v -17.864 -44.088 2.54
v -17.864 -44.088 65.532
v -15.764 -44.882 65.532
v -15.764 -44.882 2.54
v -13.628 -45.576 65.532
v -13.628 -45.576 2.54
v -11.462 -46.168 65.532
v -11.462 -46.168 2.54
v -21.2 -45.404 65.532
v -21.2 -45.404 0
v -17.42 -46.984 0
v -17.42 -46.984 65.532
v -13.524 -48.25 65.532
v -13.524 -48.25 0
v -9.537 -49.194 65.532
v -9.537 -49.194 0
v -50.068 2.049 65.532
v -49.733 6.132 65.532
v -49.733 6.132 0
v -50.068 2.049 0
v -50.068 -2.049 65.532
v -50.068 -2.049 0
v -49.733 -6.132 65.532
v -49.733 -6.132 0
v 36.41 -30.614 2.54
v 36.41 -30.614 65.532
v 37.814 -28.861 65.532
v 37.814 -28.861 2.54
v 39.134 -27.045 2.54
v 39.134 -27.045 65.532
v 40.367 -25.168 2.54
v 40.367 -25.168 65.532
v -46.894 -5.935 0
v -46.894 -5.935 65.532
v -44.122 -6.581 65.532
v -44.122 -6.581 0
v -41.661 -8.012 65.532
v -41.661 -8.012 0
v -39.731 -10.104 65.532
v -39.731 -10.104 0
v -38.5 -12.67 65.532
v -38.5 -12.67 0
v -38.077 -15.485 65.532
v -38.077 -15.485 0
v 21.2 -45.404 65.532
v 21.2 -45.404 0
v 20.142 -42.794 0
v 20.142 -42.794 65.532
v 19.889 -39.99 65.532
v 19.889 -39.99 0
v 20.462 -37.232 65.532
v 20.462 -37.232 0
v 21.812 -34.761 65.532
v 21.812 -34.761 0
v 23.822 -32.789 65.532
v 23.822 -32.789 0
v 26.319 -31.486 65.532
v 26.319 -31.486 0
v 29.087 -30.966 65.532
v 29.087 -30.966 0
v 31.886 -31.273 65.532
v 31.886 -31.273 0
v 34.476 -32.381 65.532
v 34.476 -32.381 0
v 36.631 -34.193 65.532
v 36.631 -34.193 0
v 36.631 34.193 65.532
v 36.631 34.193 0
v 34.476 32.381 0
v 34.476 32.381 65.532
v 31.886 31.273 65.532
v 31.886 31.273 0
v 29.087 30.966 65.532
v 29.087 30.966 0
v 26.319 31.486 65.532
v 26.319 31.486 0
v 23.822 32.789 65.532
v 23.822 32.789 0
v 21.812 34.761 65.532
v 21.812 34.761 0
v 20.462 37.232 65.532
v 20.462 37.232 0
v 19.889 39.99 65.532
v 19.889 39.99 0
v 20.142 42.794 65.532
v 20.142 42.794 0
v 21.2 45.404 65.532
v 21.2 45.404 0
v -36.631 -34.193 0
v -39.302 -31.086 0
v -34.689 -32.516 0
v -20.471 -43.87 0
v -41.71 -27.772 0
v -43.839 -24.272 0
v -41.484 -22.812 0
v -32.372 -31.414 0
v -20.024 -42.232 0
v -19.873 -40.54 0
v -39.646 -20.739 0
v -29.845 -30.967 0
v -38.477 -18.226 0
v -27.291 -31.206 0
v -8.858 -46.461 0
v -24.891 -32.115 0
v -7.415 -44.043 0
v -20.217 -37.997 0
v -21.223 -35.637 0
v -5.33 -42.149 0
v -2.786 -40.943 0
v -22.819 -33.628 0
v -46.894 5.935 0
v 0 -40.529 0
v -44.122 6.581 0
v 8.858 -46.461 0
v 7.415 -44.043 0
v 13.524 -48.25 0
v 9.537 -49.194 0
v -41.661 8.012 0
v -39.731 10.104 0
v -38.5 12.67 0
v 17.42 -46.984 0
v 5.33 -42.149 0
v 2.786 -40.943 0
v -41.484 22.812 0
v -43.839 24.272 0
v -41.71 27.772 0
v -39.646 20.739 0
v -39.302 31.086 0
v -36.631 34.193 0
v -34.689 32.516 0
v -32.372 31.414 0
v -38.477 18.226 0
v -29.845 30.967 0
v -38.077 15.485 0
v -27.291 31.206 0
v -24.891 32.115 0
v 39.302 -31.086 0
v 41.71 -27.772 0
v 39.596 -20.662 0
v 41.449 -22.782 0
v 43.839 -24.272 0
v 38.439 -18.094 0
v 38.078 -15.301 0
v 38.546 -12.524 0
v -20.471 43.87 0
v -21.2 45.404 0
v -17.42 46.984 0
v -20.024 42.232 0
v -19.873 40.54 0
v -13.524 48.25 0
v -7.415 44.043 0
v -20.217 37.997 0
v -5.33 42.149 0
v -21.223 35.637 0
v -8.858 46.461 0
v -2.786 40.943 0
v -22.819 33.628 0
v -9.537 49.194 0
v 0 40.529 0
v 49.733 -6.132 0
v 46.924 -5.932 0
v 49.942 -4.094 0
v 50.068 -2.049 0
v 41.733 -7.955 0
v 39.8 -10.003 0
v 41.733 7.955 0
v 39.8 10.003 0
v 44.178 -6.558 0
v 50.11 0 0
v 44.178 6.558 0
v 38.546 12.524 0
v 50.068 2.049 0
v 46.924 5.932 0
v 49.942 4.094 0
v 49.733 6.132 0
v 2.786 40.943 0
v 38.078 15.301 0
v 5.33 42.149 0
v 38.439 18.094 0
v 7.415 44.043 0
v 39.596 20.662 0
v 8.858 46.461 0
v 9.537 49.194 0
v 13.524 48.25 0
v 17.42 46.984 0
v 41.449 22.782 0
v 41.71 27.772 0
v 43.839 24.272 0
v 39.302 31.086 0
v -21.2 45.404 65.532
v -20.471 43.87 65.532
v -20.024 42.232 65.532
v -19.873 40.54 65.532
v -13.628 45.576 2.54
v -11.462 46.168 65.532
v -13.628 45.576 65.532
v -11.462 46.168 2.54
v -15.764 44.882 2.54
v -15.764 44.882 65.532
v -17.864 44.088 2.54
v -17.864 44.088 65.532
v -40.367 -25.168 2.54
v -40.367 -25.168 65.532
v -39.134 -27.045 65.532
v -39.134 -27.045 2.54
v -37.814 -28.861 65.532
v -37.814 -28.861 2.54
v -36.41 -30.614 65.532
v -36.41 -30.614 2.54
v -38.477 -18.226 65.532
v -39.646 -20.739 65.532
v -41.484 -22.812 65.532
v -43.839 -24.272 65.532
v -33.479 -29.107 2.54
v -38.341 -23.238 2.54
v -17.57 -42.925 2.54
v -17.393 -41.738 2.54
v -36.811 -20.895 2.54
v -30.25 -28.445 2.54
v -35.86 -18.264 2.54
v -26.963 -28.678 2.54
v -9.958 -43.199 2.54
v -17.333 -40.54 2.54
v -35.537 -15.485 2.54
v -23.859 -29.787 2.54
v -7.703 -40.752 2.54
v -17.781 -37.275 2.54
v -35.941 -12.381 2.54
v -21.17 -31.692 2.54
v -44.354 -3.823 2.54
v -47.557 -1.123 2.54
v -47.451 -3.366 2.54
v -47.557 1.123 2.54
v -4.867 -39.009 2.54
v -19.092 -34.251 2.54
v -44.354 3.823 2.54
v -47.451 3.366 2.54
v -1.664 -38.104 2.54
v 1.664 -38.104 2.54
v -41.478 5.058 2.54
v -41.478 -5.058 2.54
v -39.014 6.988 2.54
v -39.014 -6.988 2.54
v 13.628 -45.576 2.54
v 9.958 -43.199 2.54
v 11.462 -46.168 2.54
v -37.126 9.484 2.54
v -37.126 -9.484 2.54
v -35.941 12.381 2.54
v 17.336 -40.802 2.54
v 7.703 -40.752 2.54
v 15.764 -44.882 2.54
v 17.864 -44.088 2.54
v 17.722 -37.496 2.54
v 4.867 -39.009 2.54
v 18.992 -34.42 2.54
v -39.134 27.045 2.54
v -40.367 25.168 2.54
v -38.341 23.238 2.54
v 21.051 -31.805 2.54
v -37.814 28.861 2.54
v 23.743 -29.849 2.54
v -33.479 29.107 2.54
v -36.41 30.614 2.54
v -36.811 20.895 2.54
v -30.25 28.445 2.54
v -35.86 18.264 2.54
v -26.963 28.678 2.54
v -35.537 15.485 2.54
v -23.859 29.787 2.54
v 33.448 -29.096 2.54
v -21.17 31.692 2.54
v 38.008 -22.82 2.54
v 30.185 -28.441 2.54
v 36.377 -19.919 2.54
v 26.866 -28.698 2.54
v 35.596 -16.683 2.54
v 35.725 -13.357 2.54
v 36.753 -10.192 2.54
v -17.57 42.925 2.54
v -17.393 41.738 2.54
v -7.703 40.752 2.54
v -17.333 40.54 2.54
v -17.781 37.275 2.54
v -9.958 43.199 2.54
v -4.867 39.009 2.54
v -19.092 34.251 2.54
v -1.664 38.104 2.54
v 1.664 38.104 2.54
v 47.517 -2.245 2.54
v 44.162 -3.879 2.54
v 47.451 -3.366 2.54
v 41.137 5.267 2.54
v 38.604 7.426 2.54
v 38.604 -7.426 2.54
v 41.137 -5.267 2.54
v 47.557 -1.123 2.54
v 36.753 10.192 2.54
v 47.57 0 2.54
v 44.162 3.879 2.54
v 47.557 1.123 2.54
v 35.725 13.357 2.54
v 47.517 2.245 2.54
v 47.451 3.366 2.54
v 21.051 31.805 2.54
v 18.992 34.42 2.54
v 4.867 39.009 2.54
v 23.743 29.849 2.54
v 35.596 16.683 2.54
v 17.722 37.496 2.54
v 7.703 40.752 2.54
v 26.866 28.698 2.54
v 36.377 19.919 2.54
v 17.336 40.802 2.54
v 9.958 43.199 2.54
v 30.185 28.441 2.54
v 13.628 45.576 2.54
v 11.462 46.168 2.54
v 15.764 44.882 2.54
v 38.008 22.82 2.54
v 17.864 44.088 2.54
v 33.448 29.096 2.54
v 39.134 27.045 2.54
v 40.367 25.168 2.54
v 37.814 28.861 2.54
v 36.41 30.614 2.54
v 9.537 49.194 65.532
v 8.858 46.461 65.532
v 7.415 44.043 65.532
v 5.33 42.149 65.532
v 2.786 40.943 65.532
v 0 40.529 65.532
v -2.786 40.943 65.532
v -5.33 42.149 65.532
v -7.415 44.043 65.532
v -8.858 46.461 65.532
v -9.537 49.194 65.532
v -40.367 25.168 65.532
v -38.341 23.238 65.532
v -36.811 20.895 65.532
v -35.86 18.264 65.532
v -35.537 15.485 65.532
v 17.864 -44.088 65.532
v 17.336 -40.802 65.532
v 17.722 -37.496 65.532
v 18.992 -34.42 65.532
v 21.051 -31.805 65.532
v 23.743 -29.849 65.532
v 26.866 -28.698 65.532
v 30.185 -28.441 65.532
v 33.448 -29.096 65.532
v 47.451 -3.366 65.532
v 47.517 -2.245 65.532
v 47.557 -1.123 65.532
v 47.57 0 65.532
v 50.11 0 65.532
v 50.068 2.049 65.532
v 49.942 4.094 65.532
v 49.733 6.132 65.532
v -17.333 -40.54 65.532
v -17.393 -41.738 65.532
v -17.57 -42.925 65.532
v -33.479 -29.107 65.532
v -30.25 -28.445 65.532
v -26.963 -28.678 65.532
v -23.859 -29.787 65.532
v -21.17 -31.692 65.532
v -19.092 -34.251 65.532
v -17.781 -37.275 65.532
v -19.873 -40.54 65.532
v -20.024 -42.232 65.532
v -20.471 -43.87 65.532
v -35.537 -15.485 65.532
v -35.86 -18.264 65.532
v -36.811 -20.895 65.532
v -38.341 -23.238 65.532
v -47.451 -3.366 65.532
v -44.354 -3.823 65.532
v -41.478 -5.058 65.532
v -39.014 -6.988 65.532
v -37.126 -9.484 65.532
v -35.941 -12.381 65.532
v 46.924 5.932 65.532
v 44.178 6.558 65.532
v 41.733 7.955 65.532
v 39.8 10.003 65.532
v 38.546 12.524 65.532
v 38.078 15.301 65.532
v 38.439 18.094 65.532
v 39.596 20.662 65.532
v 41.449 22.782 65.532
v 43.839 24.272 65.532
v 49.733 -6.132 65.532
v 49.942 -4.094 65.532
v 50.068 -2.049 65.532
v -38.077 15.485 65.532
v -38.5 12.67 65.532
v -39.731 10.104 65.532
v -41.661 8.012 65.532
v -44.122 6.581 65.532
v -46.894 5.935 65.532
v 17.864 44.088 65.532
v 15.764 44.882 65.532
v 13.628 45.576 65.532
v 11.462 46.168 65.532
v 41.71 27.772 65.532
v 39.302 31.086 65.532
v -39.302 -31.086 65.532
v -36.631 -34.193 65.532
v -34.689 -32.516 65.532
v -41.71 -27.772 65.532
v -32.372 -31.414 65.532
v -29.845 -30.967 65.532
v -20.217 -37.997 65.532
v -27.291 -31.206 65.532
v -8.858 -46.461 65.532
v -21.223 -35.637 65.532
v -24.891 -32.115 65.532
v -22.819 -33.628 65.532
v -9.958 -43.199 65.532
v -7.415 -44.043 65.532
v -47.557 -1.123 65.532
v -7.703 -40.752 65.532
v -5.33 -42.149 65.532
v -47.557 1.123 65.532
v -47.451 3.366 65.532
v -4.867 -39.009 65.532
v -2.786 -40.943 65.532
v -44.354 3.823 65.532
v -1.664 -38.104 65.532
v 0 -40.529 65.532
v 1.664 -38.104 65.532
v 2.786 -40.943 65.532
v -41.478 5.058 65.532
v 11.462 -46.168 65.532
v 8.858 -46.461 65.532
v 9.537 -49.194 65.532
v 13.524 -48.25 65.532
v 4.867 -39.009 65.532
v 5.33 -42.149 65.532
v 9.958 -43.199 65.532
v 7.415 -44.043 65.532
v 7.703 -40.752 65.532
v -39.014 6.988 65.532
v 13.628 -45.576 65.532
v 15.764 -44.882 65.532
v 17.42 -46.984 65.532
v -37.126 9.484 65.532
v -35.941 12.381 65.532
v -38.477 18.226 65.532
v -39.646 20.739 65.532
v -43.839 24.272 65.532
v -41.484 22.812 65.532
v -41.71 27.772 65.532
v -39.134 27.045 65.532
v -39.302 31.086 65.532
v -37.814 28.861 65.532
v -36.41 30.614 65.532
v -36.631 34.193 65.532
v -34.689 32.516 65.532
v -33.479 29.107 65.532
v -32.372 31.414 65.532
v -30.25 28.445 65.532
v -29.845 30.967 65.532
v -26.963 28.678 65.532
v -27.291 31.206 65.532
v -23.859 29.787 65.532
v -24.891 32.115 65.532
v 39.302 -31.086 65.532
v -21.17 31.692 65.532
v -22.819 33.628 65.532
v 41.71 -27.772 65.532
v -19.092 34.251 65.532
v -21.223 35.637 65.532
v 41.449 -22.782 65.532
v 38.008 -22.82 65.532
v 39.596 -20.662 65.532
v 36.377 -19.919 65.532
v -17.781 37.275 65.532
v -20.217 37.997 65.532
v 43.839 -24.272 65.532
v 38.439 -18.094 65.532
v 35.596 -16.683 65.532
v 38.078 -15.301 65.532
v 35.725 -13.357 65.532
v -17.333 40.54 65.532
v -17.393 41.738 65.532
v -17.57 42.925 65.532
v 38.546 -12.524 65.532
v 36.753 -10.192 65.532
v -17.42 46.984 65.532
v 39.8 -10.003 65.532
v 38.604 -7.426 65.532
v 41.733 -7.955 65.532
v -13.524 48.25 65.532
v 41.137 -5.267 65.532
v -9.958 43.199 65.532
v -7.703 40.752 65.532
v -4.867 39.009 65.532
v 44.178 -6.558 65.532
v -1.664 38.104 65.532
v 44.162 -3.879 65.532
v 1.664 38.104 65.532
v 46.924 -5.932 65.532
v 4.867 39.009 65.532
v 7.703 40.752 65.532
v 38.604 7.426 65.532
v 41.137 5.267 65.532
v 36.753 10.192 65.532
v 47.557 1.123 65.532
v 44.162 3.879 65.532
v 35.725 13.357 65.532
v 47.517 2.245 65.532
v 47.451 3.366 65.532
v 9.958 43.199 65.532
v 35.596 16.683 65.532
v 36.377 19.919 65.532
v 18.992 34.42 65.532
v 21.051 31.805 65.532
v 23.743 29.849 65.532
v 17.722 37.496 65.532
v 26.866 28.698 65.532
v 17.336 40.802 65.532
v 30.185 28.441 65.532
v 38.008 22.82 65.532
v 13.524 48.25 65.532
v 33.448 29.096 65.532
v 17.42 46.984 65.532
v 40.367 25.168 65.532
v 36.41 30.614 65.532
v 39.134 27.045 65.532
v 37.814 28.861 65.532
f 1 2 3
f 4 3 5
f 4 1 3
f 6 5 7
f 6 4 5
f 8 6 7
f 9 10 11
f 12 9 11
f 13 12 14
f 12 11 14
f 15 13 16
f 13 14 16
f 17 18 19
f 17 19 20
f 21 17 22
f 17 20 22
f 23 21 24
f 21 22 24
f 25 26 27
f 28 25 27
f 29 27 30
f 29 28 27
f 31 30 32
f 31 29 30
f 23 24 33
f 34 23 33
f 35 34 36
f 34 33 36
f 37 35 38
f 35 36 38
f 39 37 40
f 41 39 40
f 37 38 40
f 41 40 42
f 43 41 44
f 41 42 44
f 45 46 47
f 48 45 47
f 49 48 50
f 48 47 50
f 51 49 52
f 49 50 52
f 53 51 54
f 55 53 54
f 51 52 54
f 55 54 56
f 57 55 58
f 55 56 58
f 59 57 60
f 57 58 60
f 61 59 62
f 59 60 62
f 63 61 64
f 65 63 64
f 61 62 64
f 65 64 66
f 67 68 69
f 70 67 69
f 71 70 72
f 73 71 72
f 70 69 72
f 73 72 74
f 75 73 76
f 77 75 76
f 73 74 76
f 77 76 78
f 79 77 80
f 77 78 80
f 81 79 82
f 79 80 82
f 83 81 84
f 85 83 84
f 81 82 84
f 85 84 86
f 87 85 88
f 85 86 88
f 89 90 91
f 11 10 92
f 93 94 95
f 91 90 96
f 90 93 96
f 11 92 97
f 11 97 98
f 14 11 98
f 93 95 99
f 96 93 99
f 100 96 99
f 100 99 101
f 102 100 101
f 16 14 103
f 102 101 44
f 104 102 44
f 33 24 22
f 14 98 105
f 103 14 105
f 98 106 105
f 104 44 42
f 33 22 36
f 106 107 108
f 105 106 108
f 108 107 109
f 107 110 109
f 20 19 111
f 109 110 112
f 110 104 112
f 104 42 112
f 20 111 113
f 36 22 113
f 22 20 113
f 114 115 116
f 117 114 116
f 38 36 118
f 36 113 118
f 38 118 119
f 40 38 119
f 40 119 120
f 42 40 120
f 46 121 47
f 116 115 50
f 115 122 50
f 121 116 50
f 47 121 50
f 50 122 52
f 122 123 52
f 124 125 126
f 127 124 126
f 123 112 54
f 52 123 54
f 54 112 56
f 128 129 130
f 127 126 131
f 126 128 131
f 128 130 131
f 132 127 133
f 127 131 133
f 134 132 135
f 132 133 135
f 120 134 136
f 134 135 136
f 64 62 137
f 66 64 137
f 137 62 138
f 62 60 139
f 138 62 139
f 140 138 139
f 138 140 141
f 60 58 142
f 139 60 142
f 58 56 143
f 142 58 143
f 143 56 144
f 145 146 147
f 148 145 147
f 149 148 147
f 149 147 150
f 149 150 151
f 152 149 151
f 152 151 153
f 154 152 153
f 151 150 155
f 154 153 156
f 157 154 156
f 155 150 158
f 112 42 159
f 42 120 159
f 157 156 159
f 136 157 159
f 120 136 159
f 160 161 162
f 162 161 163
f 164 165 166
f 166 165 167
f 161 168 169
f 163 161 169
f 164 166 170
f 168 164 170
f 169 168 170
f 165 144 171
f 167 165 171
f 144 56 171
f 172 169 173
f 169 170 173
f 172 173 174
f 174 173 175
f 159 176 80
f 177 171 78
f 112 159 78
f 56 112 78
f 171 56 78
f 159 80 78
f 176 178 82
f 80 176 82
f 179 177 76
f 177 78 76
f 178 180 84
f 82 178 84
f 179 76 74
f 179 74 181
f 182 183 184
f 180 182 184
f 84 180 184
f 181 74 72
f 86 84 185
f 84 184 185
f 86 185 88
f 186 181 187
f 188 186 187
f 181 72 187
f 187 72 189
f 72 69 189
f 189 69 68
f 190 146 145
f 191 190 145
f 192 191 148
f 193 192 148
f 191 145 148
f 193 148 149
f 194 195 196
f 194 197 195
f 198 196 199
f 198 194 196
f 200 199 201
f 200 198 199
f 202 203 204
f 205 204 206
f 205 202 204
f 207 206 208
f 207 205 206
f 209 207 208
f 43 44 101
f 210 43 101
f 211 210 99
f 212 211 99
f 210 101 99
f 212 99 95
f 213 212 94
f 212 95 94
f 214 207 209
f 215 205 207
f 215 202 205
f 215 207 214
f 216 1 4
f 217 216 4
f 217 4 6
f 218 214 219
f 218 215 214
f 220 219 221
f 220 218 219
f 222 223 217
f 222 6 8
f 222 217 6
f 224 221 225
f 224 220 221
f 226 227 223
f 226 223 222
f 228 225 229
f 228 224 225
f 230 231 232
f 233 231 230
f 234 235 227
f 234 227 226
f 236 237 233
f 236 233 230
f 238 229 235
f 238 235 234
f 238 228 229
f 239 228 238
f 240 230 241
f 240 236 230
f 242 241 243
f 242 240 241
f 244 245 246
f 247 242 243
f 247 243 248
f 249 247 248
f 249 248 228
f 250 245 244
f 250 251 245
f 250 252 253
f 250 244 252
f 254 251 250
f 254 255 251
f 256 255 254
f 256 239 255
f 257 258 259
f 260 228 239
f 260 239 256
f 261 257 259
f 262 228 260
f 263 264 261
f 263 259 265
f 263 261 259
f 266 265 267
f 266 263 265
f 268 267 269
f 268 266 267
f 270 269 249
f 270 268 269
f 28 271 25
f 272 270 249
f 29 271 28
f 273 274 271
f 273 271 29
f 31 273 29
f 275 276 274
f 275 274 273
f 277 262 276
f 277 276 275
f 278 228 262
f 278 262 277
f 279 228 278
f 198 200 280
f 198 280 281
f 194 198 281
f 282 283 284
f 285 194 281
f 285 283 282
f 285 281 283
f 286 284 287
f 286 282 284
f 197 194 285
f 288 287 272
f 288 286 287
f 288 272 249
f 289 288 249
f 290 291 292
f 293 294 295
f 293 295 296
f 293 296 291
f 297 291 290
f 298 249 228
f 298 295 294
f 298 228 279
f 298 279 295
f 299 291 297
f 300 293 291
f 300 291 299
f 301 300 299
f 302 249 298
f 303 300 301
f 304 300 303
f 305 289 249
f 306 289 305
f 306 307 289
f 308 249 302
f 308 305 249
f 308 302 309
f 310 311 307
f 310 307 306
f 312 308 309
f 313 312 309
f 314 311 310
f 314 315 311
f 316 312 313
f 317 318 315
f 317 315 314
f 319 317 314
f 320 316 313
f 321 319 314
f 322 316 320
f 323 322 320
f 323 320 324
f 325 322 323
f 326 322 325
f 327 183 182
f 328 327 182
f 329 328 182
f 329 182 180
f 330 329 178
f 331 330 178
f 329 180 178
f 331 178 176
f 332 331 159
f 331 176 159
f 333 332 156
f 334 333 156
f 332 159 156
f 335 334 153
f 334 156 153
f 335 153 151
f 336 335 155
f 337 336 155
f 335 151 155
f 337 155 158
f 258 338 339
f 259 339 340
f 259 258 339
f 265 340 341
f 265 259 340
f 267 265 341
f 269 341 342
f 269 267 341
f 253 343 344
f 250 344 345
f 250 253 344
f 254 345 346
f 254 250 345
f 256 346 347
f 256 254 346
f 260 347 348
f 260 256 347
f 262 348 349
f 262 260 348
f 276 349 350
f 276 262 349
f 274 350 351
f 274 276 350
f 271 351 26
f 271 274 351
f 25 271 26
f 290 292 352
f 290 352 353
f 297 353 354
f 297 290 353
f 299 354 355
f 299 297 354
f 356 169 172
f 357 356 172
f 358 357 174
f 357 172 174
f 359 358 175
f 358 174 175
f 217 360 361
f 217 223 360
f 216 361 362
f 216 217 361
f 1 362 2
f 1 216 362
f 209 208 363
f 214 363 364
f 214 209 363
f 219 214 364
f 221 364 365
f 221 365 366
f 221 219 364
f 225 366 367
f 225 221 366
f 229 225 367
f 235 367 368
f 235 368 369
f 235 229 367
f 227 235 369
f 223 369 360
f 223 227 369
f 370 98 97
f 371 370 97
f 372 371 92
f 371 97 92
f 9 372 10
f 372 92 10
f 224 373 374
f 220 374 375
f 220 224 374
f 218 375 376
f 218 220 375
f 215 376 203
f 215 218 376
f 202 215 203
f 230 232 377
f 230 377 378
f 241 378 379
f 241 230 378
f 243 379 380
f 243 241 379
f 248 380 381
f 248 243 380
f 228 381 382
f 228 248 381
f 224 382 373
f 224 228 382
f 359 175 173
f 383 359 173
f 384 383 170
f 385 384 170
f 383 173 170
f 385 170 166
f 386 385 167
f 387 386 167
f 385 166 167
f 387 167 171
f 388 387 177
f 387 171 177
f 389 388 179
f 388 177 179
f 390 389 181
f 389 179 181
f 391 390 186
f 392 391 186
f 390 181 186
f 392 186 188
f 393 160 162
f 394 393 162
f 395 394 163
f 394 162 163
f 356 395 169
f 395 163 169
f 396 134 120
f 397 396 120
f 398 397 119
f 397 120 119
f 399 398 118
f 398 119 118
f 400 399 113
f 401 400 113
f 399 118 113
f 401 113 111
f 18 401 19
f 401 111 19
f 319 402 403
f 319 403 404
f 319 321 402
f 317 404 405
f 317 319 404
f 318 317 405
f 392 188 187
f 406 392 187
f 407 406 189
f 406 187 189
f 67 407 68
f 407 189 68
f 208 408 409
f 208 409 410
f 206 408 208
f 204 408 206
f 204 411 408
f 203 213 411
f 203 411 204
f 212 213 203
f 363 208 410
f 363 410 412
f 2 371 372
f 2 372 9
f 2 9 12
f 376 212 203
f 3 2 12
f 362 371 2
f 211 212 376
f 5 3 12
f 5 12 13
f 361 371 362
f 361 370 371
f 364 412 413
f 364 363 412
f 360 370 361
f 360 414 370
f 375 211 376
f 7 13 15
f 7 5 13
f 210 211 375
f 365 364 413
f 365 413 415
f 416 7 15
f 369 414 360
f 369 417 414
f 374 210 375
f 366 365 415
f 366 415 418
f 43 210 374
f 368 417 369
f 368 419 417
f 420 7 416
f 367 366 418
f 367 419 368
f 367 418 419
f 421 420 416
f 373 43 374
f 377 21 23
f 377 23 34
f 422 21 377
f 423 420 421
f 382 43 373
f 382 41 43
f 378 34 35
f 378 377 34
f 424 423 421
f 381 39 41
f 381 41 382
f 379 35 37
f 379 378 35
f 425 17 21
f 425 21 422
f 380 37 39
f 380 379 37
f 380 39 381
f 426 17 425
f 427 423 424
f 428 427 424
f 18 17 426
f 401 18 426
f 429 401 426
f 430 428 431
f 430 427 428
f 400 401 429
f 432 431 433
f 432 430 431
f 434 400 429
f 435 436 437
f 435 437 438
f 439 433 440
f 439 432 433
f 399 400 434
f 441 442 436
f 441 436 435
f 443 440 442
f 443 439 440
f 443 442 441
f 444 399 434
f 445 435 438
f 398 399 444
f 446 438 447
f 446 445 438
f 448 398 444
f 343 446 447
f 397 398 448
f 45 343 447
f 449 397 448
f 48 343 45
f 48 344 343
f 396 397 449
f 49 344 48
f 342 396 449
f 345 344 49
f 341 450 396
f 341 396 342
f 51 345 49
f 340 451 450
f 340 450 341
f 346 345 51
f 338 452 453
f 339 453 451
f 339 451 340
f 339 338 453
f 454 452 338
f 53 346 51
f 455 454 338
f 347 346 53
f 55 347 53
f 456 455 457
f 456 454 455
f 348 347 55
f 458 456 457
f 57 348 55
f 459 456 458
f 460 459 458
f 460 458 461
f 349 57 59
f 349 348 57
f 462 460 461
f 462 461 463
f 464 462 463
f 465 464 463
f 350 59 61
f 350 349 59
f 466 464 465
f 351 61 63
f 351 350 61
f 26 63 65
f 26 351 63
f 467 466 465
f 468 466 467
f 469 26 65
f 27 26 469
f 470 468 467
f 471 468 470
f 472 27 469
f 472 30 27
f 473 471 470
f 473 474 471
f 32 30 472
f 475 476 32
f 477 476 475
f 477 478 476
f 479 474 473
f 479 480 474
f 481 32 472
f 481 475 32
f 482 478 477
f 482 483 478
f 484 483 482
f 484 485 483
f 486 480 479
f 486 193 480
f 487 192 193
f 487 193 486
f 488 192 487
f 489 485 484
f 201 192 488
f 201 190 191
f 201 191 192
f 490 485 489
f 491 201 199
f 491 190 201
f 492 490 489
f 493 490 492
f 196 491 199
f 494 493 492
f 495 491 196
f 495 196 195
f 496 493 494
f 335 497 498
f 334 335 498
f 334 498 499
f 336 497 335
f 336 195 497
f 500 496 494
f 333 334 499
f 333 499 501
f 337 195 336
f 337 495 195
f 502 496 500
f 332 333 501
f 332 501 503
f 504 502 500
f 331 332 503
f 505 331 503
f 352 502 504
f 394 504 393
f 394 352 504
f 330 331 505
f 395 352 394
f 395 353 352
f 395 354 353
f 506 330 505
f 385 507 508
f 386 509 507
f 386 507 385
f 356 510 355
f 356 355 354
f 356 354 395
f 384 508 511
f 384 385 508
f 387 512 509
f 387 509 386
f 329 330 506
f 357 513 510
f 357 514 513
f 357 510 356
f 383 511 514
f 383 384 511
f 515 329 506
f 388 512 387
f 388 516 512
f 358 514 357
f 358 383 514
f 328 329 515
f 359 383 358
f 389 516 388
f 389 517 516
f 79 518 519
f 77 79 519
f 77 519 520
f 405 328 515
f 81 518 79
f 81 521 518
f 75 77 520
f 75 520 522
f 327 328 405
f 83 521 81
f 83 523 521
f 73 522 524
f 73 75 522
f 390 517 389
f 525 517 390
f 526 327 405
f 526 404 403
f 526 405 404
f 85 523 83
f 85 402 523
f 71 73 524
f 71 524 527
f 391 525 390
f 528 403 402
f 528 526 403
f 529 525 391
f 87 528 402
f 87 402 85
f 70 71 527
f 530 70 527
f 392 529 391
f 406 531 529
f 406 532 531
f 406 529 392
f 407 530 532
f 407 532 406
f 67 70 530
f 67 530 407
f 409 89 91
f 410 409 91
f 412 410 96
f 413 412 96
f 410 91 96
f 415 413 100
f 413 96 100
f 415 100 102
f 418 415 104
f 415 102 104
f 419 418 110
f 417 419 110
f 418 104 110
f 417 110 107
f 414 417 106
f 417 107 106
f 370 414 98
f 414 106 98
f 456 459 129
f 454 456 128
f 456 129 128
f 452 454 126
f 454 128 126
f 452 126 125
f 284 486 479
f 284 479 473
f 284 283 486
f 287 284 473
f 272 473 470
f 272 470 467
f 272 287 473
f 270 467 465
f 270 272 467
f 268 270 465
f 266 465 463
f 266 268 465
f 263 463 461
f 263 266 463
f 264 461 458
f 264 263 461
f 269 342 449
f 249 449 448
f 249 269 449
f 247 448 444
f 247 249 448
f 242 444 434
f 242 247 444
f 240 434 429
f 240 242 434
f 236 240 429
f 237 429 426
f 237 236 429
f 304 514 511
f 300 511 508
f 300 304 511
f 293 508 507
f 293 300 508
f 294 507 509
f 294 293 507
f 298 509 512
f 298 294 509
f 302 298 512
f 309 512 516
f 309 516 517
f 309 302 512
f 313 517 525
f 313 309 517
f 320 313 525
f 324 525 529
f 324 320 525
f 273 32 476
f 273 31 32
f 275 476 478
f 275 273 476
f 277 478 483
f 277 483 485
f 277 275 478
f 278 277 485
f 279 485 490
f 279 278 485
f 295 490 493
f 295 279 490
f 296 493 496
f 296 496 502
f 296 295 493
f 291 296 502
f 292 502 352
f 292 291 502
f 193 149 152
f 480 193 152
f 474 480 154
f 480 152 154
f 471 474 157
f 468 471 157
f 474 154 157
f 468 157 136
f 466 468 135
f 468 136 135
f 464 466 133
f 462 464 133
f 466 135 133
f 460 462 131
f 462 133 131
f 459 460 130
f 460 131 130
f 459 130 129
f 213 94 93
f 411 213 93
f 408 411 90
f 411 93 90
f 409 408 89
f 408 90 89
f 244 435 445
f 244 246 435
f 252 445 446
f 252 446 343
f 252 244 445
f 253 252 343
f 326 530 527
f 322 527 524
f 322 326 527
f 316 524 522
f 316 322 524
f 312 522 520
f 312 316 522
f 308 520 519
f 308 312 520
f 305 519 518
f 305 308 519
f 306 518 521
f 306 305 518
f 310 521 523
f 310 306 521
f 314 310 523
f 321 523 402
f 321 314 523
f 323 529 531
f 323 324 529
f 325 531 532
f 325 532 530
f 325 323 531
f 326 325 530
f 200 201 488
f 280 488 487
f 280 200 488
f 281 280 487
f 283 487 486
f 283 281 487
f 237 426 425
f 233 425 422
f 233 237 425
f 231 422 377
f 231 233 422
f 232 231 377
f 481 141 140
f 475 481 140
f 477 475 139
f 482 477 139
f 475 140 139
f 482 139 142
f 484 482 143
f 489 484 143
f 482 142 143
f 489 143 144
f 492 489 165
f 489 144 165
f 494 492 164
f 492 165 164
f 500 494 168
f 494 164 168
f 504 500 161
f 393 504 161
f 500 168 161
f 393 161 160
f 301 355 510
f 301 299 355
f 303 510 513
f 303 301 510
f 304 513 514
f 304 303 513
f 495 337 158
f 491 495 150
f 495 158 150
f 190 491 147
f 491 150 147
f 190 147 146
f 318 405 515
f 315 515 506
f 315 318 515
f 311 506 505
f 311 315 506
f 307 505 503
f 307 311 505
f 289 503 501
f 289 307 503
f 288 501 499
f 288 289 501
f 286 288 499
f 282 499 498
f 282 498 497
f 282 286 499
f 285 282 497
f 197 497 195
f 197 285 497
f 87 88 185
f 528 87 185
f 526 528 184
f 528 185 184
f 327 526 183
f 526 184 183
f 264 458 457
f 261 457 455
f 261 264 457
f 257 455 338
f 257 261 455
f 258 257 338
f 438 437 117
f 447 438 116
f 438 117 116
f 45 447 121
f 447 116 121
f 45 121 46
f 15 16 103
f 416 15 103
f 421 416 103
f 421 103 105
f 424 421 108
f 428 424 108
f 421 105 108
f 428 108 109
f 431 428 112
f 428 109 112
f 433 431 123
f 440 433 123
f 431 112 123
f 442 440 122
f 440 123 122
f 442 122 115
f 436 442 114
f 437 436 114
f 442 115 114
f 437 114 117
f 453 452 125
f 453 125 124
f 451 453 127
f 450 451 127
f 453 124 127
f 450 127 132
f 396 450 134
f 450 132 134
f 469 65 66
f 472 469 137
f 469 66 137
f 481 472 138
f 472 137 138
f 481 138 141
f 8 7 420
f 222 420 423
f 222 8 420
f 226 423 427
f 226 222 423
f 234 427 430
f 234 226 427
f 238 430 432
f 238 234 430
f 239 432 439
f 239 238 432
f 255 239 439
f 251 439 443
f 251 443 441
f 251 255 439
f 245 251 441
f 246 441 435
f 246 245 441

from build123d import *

# Parameters (mm, degrees)
F1_DEPTH = 65.532
F2_T     = -2.54


with BuildPart() as f1:
    # F0 (on Top) → F1 (new body)
    with BuildSketch(Plane.XY):
        with BuildLine():
            ThreePointArc((49.733212, -6.131827), (50.015562, -3.07169), (50.109797, 0))
            ThreePointArc((50.109797, 0), (50.015562, 3.07169), (49.733212, 6.131827))
            ThreePointArc((49.733212, 6.131827), (38.545584, 12.524219), (43.839211, 24.271697))
            ThreePointArc((43.839211, 24.271697), (40.539677, 29.453799), (36.630817, 34.193201))
            ThreePointArc((36.630817, 34.193201), (23.822481, 32.788832), (21.200121, 45.404257))
            ThreePointArc((21.200121, 45.404257), (15.484779, 47.657249), (9.536694, 49.193934))
            ThreePointArc((9.536694, 49.193934), (0, 40.529226), (-9.536694, 49.193934))
            ThreePointArc((-9.536694, 49.193934), (-15.484779, 47.657249), (-21.200121, 45.404257))
            ThreePointArc((-21.200121, 45.404257), (-20.210903, 43.060827), (-19.873228, 40.539677))
            ThreePointArc((-19.873228, 40.539677), (-26.060614, 31.580122), (-36.630817, 34.193201))
            ThreePointArc((-36.630817, 34.193201), (-40.539677, 29.453799), (-43.839211, 24.271697))
            ThreePointArc((-43.839211, 24.271697), (-39.645809, 20.738747), (-38.076678, 15.484779))
            ThreePointArc((-38.076678, 15.484779), (-41.661483, 8.012287), (-49.733212, 6.131827))
            ThreePointArc((-49.733212, 6.131827), (-50.109797, 0), (-49.733212, -6.131827))
            ThreePointArc((-49.733212, -6.131827), (-41.661483, -8.012287), (-38.076678, -15.484779))
            ThreePointArc((-38.076678, -15.484779), (-39.645809, -20.738747), (-43.839211, -24.271697))
            ThreePointArc((-43.839211, -24.271697), (-40.539677, -29.453799), (-36.630817, -34.193201))
            ThreePointArc((-36.630817, -34.193201), (-26.060614, -31.580122), (-19.873228, -40.539677))
            ThreePointArc((-19.873228, -40.539677), (-20.210903, -43.060827), (-21.200121, -45.404257))
            ThreePointArc((-21.200121, -45.404257), (-15.484779, -47.657249), (-9.536694, -49.193934))
            ThreePointArc((-9.536694, -49.193934), (0, -40.529226), (9.536694, -49.193934))
            ThreePointArc((9.536694, -49.193934), (15.484779, -47.657249), (21.200121, -45.404257))
            ThreePointArc((21.200121, -45.404257), (23.822481, -32.788832), (36.630817, -34.193201))
            ThreePointArc((36.630817, -34.193201), (40.539677, -29.453799), (43.839211, -24.271697))
            ThreePointArc((43.839211, -24.271697), (38.545584, -12.524219), (49.733212, -6.131827))
        make_face()
    extrude(amount=F1_DEPTH)

    # F2
    f2_openings = [f1.faces().sort_by_distance(p)[0] for p in [
        (0, 0, 65.532),
    ]]
    offset(amount=F2_T, openings=f2_openings)


solid = f1.part
